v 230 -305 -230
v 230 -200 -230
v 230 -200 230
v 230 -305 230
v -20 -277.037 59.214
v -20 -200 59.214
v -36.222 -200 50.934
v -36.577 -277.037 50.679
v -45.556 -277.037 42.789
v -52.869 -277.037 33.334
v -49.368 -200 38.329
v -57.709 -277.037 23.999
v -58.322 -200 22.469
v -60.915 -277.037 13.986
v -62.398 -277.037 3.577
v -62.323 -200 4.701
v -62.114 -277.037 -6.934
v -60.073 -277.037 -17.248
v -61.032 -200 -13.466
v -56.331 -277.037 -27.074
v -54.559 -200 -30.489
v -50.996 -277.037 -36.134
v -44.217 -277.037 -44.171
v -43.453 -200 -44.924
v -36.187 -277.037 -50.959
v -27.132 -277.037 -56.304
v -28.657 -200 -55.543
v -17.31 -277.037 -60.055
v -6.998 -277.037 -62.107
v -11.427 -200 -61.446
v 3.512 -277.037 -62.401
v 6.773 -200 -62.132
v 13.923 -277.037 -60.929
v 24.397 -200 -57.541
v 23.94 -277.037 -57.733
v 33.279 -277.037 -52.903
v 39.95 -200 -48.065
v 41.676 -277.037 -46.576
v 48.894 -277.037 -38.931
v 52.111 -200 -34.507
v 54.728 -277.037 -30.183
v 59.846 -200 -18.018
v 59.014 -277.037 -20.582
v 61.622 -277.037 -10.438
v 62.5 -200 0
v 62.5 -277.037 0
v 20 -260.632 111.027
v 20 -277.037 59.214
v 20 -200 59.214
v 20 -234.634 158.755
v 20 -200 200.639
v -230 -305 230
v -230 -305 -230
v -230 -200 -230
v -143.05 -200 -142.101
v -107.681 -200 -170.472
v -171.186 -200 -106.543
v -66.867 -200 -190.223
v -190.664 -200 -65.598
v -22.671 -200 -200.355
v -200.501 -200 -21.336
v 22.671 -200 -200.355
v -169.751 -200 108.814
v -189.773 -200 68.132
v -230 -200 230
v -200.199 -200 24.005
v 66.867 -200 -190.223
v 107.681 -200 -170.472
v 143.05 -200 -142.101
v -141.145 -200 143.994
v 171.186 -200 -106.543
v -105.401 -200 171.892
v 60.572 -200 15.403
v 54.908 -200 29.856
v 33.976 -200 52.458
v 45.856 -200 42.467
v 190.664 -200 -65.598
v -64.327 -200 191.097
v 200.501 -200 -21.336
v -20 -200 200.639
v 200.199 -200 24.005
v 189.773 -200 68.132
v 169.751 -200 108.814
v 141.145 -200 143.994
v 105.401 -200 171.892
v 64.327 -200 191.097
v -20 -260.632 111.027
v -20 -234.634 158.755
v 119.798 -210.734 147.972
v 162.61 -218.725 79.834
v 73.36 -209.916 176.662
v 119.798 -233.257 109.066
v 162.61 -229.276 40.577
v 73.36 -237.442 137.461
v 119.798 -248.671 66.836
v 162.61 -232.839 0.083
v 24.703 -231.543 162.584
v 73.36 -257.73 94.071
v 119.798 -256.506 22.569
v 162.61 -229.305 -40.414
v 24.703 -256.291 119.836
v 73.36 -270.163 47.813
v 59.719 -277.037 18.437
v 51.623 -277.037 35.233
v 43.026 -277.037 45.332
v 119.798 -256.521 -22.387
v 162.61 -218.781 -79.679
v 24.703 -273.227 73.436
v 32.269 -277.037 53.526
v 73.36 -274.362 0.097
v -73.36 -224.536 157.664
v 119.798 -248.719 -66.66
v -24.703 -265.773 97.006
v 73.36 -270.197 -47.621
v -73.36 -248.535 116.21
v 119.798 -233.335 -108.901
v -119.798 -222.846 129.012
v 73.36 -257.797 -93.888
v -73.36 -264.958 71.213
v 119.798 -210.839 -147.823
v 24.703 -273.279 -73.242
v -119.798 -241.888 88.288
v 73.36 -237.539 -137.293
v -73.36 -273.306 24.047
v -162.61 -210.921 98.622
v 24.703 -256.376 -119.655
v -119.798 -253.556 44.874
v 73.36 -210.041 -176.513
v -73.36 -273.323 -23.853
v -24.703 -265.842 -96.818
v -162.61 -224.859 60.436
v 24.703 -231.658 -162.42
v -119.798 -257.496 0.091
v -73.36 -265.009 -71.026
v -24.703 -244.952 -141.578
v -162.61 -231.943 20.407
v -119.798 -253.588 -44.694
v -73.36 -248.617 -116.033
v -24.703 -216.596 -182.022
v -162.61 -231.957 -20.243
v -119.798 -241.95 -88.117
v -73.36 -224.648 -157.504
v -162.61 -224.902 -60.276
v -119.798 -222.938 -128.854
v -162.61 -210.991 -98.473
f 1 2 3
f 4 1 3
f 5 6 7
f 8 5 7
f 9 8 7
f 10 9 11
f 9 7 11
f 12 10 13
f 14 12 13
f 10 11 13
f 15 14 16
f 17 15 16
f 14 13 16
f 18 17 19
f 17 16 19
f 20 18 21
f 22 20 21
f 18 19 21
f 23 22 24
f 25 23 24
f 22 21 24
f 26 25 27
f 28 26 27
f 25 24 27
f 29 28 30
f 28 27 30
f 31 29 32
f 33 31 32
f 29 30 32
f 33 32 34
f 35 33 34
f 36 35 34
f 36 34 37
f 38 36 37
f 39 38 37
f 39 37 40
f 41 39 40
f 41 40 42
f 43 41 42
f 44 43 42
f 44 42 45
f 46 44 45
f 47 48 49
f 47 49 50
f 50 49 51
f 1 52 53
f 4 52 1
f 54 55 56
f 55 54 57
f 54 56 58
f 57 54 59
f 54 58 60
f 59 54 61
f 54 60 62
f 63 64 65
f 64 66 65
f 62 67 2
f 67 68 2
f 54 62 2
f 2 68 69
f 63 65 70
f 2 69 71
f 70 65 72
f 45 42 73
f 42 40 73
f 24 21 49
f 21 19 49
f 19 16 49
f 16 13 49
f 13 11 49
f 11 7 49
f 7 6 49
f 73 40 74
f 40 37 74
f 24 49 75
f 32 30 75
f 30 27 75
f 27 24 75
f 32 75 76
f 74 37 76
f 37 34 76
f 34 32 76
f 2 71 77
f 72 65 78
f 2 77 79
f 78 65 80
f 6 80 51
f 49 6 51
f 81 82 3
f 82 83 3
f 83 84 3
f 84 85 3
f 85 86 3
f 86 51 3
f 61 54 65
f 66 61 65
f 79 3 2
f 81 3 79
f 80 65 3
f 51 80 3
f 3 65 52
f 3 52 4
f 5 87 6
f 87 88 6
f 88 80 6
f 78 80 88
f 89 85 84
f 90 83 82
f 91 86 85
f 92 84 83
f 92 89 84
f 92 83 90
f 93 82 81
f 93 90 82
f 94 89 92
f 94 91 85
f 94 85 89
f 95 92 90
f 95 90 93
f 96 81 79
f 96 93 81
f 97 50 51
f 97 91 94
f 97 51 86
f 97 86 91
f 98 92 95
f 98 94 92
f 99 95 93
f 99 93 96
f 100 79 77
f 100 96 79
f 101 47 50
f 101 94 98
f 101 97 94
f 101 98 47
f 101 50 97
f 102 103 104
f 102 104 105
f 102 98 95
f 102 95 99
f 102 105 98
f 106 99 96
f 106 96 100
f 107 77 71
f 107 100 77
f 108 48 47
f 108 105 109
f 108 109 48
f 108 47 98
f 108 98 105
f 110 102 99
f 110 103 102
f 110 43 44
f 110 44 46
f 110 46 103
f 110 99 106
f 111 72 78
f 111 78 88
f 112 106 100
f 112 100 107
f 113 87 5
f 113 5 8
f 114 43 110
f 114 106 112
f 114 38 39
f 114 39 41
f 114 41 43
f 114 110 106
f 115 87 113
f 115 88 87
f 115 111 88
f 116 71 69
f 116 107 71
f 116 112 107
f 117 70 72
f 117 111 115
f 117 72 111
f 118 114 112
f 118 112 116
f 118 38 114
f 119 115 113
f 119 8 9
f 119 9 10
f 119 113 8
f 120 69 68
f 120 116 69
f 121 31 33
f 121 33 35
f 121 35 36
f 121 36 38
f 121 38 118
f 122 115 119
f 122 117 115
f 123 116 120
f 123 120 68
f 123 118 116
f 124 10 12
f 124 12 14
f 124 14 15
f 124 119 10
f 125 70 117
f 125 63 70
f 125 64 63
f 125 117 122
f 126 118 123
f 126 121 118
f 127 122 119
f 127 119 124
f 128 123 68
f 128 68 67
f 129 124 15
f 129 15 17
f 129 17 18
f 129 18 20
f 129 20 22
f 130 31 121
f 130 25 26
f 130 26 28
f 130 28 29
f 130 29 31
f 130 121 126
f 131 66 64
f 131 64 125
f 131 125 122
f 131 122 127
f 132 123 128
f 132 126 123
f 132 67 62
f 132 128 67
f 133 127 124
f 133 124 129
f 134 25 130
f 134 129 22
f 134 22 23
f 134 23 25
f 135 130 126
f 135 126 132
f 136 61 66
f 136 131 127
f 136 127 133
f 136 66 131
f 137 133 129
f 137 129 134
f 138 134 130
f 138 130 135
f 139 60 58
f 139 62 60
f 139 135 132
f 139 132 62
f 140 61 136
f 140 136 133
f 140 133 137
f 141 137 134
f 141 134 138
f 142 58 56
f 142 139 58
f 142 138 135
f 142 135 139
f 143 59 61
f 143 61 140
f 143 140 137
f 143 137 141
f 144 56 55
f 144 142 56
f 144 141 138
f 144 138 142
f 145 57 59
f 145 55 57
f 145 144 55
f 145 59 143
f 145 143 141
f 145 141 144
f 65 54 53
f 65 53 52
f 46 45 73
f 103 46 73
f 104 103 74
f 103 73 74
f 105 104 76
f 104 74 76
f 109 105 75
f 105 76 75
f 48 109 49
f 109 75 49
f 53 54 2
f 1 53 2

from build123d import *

# Parameters (mm, degrees)
F3_R     = 300
F4_DEPTH = 500
F6_DEPTH = 600
F7_W     = 460
F7_H     = 460
F8_DEPTH = 105


with BuildPart() as f1:
    # F0 (on Front) → F1 (revolve)
    with BuildSketch(Plane.XZ):
        with BuildLine():
            Line((-284, 0), (284, 0))
            ThreePointArc((284, 0), (0, 284), (-284, 0))
        make_face()
    revolve(axis=Axis((0, 0, 0), (1, 0, 0)))

    # F3 (on offset) → F4 (cut)
    with BuildSketch(Plane.XZ.offset(200)):
        Circle(F3_R)
    extrude(amount=-F4_DEPTH, mode=Mode.SUBTRACT)

    # F5 (on Front) → F6 (cut)
    with BuildSketch(Plane.XZ):
        with BuildLine():
            ThreePointArc((-20, 59.213596), (0, 62.5), (20, 59.213596))
            Line((20, 59.213596), (20, 224.58975))
            Line((20, 224.58975), (-20, 224.58975))
            Line((-20, 224.58975), (-20, 59.213596))
        make_face()
        with BuildLine():
            ThreePointArc((-20, 59.213596), (-36.443449, -50.77524), (62.5, 0))
            ThreePointArc((62.5, 0), (50.77524, 36.443449), (20, 59.213596))
            Line((20, 59.213596), (20, 25.99727))
            Line((20, 25.99727), (-20, 25.99727))
            Line((-20, 25.99727), (-20, 59.213596))
        make_face()
        with BuildLine():
            Line((20, 25.99727), (20, 59.213596))
            ThreePointArc((20, 59.213596), (0, 62.5), (-20, 59.213596))
            Line((-20, 59.213596), (-20, 25.99727))
            Line((-20, 25.99727), (20, 25.99727))
        make_face()
    extrude(amount=F6_DEPTH, mode=Mode.SUBTRACT)


with BuildPart() as f8:
    # F7 (on offset) → F8 (new body)
    with BuildSketch(Plane.XZ.offset(200)):
        Rectangle(F7_W, F7_H)
    extrude(amount=F8_DEPTH)

    # F9: cut F1
    add(f1.part, mode=Mode.SUBTRACT)


solid = f8.part
